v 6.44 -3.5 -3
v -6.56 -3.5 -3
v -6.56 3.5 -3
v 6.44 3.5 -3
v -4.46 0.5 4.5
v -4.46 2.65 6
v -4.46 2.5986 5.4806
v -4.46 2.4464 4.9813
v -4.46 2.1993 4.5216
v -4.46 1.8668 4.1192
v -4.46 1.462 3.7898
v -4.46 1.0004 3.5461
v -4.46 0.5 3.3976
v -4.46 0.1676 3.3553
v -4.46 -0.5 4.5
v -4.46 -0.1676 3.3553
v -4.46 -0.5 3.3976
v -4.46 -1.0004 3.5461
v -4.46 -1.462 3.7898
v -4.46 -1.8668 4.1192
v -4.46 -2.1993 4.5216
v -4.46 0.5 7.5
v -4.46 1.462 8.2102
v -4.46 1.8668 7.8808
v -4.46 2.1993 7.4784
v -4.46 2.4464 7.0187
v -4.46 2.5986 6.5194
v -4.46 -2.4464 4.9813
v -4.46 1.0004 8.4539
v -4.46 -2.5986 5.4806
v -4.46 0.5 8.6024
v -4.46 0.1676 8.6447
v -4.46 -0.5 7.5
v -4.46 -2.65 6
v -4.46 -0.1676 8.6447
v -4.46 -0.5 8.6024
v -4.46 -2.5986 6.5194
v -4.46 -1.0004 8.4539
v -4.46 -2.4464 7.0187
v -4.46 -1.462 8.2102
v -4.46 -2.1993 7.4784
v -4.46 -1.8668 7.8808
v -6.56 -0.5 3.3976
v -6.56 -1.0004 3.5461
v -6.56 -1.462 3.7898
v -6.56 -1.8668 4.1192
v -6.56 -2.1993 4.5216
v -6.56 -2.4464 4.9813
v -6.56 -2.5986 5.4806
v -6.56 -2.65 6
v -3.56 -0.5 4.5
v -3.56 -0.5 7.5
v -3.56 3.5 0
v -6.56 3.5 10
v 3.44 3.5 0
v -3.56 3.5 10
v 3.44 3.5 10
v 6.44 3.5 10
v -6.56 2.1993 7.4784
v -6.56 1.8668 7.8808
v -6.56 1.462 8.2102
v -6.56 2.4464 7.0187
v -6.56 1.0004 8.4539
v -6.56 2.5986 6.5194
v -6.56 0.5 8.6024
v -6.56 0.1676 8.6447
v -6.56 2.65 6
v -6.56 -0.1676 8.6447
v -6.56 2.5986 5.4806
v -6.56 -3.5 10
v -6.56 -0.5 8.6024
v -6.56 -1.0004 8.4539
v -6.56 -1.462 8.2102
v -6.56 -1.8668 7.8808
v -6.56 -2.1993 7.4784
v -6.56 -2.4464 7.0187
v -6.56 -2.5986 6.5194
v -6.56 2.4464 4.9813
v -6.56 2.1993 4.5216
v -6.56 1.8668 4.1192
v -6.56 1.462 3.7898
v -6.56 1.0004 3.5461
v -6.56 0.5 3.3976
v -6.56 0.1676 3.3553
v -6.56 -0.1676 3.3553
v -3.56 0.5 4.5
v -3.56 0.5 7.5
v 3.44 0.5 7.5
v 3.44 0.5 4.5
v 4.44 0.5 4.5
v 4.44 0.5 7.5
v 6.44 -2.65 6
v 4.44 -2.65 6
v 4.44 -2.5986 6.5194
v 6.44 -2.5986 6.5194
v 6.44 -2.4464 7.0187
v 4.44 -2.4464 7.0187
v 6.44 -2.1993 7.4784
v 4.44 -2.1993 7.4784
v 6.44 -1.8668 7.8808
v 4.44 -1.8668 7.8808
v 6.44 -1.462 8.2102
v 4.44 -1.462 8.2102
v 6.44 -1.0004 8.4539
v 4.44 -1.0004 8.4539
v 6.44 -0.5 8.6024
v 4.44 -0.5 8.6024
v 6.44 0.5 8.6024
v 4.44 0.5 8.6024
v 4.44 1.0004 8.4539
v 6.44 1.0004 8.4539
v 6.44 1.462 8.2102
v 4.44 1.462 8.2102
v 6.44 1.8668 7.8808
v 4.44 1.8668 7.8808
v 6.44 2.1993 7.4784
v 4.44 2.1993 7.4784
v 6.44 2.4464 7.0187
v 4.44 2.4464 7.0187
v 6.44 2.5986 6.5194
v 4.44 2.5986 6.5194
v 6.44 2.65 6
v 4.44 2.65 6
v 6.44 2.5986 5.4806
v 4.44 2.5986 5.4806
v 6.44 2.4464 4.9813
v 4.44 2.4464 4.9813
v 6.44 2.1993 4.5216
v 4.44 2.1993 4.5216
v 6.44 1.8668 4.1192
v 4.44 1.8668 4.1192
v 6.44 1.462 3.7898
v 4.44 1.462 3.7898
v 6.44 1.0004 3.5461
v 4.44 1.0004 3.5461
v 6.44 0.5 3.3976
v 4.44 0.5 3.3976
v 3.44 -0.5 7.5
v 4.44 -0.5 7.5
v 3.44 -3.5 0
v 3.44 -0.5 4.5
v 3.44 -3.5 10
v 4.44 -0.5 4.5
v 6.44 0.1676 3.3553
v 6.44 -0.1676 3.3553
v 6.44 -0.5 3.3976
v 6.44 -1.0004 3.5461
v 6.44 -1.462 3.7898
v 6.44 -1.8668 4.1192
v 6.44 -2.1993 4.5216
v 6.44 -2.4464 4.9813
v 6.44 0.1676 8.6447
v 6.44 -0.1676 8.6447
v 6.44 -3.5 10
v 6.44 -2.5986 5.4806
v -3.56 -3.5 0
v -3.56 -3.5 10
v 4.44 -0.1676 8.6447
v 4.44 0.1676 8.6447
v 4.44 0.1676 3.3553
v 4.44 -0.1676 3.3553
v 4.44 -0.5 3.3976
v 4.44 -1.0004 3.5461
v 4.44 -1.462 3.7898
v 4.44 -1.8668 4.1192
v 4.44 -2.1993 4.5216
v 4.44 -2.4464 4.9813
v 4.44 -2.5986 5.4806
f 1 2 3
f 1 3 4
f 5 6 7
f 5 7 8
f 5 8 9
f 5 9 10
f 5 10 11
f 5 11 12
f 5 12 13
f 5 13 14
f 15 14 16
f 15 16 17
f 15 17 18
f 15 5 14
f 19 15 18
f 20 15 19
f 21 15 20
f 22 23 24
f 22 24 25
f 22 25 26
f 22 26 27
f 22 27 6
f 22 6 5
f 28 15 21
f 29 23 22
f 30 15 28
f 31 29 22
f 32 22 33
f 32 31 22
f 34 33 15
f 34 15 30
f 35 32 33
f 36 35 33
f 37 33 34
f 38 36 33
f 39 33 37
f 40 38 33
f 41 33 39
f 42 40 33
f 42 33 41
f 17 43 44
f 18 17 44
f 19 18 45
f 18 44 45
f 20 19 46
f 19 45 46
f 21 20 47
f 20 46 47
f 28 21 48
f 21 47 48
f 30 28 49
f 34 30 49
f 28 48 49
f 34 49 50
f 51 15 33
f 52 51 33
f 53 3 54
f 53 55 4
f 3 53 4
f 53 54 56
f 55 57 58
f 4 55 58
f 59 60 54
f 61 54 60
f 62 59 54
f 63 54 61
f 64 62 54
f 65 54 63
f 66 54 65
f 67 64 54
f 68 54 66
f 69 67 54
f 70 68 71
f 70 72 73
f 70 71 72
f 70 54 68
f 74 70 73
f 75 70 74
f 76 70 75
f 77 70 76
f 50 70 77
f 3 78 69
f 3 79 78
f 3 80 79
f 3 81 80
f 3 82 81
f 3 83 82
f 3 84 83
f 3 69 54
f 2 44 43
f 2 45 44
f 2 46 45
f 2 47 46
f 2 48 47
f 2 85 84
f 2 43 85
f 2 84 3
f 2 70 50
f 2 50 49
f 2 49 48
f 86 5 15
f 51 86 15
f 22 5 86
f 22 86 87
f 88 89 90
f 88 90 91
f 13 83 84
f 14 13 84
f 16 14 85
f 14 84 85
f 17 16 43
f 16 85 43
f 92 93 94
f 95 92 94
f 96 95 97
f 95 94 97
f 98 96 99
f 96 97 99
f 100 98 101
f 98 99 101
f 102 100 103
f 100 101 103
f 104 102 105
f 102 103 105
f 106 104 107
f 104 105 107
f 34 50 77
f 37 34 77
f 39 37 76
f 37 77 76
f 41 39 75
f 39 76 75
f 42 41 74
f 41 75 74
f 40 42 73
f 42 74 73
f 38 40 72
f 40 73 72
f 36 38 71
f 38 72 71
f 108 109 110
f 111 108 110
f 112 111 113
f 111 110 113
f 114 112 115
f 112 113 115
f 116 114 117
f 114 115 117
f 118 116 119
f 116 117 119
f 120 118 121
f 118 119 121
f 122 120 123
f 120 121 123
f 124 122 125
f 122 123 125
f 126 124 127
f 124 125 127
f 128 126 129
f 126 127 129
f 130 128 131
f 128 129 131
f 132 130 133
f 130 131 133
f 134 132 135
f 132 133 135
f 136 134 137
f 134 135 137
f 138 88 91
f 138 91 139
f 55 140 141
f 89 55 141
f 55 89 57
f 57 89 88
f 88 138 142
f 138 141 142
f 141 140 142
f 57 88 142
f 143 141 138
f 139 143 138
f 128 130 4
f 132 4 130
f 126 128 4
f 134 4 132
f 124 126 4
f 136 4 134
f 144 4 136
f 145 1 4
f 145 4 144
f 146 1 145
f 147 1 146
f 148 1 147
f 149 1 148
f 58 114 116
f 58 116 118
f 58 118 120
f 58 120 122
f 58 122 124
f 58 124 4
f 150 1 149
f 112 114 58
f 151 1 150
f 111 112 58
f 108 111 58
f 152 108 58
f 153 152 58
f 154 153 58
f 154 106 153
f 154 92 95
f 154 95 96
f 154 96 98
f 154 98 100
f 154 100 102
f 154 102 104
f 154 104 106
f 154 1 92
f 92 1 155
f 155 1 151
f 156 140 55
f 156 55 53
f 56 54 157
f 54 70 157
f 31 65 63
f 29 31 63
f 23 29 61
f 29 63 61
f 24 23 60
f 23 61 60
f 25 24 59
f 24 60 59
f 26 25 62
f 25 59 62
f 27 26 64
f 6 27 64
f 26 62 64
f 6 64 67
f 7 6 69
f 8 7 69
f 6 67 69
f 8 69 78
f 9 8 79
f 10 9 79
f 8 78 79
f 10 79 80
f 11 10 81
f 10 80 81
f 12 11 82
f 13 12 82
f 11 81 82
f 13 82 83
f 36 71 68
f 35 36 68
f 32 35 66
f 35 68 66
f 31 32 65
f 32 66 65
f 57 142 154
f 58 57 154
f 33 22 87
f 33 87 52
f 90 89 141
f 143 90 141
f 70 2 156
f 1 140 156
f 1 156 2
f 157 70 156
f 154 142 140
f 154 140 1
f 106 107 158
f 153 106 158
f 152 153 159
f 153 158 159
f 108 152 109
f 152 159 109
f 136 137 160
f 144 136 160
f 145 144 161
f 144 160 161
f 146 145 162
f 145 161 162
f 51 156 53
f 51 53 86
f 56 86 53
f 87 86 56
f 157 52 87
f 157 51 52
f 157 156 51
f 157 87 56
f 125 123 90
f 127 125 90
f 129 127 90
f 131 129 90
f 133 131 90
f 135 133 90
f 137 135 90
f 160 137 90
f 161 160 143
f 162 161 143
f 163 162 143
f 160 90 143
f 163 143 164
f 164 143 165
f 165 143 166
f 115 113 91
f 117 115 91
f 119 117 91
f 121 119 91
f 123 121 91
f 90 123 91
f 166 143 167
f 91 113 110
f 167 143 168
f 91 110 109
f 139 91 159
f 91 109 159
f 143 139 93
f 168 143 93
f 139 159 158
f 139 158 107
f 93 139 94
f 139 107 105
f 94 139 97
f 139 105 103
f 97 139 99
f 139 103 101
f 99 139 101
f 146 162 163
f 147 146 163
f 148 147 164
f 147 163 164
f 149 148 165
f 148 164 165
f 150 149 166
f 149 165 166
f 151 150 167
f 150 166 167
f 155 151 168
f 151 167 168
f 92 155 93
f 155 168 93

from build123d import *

# Parameters (mm, degrees)
F0_W     = 3
F0_H     = 10
F1_DEPTH = 3.5
F2_W     = 1
F2_H     = 3
F3_DEPTH = 25
F4_DEPTH = 2.1
F5_START = -11
F5_DEPTH = 4


with BuildPart() as f1:
    # F0 (on Front) → F1 (new body, symmetric)
    with BuildSketch(Plane.XZ):
        with Locations((-5.06, 5)):
            Rectangle(F0_W, F0_H)
        Polygon((-3.56, 0), (-6.56, 0), (-6.56, -3), (6.44, -3), (6.44, 0), (3.44, 0), align=None)
        with Locations((4.94, 5)):
            Rectangle(F0_W, F0_H)
    extrude(amount=F1_DEPTH, both=True)

    # F2 (on face) → F3 (cut, symmetric)
    with BuildSketch(Plane(origin=(-6.56, 0, 0), x_dir=(0, -1, 0), z_dir=(-1, 0, 0))):
        with Locations((0, 6)):
            Rectangle(F2_W, F2_H)
    extrude(amount=F3_DEPTH, both=True, mode=Mode.SUBTRACT)

    # F2 (on face) → F4 (cut)
    with BuildSketch(Plane(origin=(-6.56, 0, 0), x_dir=(0, -1, 0), z_dir=(-1, 0, 0))):
        with BuildLine():
            Line((-0.5, 7.5), (-0.5, 8.6024027359))
            ThreePointArc((-0.5, 8.6024027359), (-2.65, 6), (-0.5, 3.3975972641))
            Line((-0.5, 3.3975972641), (-0.5, 4.5))
            Line((-0.5, 4.5), (-0.5, 7.5))
        make_face()
        with BuildLine():
            ThreePointArc((0.5, 3.3975972641), (2.0429757708, 4.312175957), (2.65, 6))
            ThreePointArc((2.65, 6), (2.0429757708, 7.687824043), (0.5, 8.6024027359))
            Line((0.5, 8.6024027359), (0.5, 7.5))
            Line((0.5, 7.5), (0.5, 4.5))
            Line((0.5, 4.5), (0.5, 3.3975972641))
        make_face()
        with BuildLine():
            Line((0.5, 7.5), (0.5, 8.6024027359))
            ThreePointArc((0.5, 8.6024027359), (0, 8.65), (-0.5, 8.6024027359))
            Line((-0.5, 8.6024027359), (-0.5, 7.5))
            Line((-0.5, 7.5), (0.5, 7.5))
        make_face()
        with BuildLine():
            ThreePointArc((-0.5, 3.3975972641), (0, 3.35), (0.5, 3.3975972641))
            Line((0.5, 3.3975972641), (0.5, 4.5))
            Line((0.5, 4.5), (-0.5, 4.5))
            Line((-0.5, 4.5), (-0.5, 3.3975972641))
        make_face()
    extrude(amount=-F4_DEPTH, mode=Mode.SUBTRACT)

    # F2 (on face) → F5 (cut)
    with BuildSketch(Plane(origin=(-6.56, 0, 0), x_dir=(0, -1, 0), z_dir=(-1, 0, 0)).offset(F5_START)):
        with BuildLine():
            Line((-0.5, 7.5), (-0.5, 8.6024027359))
            ThreePointArc((-0.5, 8.6024027359), (-2.65, 6), (-0.5, 3.3975972641))
            Line((-0.5, 3.3975972641), (-0.5, 4.5))
            Line((-0.5, 4.5), (-0.5, 7.5))
        make_face()
        with BuildLine():
            Line((0.5, 7.5), (0.5, 8.6024027359))
            ThreePointArc((0.5, 8.6024027359), (0, 8.65), (-0.5, 8.6024027359))
            Line((-0.5, 8.6024027359), (-0.5, 7.5))
            Line((-0.5, 7.5), (0.5, 7.5))
        make_face()
        with BuildLine():
            ThreePointArc((-0.5, 3.3975972641), (0, 3.35), (0.5, 3.3975972641))
            Line((0.5, 3.3975972641), (0.5, 4.5))
            Line((0.5, 4.5), (-0.5, 4.5))
            Line((-0.5, 4.5), (-0.5, 3.3975972641))
        make_face()
        with BuildLine():
            ThreePointArc((0.5, 3.3975972641), (2.0429757708, 4.312175957), (2.65, 6))
            ThreePointArc((2.65, 6), (2.0429757708, 7.687824043), (0.5, 8.6024027359))
            Line((0.5, 8.6024027359), (0.5, 7.5))
            Line((0.5, 7.5), (0.5, 4.5))
            Line((0.5, 4.5), (0.5, 3.3975972641))
        make_face()
    extrude(amount=-F5_DEPTH, mode=Mode.SUBTRACT)


solid = f1.part
